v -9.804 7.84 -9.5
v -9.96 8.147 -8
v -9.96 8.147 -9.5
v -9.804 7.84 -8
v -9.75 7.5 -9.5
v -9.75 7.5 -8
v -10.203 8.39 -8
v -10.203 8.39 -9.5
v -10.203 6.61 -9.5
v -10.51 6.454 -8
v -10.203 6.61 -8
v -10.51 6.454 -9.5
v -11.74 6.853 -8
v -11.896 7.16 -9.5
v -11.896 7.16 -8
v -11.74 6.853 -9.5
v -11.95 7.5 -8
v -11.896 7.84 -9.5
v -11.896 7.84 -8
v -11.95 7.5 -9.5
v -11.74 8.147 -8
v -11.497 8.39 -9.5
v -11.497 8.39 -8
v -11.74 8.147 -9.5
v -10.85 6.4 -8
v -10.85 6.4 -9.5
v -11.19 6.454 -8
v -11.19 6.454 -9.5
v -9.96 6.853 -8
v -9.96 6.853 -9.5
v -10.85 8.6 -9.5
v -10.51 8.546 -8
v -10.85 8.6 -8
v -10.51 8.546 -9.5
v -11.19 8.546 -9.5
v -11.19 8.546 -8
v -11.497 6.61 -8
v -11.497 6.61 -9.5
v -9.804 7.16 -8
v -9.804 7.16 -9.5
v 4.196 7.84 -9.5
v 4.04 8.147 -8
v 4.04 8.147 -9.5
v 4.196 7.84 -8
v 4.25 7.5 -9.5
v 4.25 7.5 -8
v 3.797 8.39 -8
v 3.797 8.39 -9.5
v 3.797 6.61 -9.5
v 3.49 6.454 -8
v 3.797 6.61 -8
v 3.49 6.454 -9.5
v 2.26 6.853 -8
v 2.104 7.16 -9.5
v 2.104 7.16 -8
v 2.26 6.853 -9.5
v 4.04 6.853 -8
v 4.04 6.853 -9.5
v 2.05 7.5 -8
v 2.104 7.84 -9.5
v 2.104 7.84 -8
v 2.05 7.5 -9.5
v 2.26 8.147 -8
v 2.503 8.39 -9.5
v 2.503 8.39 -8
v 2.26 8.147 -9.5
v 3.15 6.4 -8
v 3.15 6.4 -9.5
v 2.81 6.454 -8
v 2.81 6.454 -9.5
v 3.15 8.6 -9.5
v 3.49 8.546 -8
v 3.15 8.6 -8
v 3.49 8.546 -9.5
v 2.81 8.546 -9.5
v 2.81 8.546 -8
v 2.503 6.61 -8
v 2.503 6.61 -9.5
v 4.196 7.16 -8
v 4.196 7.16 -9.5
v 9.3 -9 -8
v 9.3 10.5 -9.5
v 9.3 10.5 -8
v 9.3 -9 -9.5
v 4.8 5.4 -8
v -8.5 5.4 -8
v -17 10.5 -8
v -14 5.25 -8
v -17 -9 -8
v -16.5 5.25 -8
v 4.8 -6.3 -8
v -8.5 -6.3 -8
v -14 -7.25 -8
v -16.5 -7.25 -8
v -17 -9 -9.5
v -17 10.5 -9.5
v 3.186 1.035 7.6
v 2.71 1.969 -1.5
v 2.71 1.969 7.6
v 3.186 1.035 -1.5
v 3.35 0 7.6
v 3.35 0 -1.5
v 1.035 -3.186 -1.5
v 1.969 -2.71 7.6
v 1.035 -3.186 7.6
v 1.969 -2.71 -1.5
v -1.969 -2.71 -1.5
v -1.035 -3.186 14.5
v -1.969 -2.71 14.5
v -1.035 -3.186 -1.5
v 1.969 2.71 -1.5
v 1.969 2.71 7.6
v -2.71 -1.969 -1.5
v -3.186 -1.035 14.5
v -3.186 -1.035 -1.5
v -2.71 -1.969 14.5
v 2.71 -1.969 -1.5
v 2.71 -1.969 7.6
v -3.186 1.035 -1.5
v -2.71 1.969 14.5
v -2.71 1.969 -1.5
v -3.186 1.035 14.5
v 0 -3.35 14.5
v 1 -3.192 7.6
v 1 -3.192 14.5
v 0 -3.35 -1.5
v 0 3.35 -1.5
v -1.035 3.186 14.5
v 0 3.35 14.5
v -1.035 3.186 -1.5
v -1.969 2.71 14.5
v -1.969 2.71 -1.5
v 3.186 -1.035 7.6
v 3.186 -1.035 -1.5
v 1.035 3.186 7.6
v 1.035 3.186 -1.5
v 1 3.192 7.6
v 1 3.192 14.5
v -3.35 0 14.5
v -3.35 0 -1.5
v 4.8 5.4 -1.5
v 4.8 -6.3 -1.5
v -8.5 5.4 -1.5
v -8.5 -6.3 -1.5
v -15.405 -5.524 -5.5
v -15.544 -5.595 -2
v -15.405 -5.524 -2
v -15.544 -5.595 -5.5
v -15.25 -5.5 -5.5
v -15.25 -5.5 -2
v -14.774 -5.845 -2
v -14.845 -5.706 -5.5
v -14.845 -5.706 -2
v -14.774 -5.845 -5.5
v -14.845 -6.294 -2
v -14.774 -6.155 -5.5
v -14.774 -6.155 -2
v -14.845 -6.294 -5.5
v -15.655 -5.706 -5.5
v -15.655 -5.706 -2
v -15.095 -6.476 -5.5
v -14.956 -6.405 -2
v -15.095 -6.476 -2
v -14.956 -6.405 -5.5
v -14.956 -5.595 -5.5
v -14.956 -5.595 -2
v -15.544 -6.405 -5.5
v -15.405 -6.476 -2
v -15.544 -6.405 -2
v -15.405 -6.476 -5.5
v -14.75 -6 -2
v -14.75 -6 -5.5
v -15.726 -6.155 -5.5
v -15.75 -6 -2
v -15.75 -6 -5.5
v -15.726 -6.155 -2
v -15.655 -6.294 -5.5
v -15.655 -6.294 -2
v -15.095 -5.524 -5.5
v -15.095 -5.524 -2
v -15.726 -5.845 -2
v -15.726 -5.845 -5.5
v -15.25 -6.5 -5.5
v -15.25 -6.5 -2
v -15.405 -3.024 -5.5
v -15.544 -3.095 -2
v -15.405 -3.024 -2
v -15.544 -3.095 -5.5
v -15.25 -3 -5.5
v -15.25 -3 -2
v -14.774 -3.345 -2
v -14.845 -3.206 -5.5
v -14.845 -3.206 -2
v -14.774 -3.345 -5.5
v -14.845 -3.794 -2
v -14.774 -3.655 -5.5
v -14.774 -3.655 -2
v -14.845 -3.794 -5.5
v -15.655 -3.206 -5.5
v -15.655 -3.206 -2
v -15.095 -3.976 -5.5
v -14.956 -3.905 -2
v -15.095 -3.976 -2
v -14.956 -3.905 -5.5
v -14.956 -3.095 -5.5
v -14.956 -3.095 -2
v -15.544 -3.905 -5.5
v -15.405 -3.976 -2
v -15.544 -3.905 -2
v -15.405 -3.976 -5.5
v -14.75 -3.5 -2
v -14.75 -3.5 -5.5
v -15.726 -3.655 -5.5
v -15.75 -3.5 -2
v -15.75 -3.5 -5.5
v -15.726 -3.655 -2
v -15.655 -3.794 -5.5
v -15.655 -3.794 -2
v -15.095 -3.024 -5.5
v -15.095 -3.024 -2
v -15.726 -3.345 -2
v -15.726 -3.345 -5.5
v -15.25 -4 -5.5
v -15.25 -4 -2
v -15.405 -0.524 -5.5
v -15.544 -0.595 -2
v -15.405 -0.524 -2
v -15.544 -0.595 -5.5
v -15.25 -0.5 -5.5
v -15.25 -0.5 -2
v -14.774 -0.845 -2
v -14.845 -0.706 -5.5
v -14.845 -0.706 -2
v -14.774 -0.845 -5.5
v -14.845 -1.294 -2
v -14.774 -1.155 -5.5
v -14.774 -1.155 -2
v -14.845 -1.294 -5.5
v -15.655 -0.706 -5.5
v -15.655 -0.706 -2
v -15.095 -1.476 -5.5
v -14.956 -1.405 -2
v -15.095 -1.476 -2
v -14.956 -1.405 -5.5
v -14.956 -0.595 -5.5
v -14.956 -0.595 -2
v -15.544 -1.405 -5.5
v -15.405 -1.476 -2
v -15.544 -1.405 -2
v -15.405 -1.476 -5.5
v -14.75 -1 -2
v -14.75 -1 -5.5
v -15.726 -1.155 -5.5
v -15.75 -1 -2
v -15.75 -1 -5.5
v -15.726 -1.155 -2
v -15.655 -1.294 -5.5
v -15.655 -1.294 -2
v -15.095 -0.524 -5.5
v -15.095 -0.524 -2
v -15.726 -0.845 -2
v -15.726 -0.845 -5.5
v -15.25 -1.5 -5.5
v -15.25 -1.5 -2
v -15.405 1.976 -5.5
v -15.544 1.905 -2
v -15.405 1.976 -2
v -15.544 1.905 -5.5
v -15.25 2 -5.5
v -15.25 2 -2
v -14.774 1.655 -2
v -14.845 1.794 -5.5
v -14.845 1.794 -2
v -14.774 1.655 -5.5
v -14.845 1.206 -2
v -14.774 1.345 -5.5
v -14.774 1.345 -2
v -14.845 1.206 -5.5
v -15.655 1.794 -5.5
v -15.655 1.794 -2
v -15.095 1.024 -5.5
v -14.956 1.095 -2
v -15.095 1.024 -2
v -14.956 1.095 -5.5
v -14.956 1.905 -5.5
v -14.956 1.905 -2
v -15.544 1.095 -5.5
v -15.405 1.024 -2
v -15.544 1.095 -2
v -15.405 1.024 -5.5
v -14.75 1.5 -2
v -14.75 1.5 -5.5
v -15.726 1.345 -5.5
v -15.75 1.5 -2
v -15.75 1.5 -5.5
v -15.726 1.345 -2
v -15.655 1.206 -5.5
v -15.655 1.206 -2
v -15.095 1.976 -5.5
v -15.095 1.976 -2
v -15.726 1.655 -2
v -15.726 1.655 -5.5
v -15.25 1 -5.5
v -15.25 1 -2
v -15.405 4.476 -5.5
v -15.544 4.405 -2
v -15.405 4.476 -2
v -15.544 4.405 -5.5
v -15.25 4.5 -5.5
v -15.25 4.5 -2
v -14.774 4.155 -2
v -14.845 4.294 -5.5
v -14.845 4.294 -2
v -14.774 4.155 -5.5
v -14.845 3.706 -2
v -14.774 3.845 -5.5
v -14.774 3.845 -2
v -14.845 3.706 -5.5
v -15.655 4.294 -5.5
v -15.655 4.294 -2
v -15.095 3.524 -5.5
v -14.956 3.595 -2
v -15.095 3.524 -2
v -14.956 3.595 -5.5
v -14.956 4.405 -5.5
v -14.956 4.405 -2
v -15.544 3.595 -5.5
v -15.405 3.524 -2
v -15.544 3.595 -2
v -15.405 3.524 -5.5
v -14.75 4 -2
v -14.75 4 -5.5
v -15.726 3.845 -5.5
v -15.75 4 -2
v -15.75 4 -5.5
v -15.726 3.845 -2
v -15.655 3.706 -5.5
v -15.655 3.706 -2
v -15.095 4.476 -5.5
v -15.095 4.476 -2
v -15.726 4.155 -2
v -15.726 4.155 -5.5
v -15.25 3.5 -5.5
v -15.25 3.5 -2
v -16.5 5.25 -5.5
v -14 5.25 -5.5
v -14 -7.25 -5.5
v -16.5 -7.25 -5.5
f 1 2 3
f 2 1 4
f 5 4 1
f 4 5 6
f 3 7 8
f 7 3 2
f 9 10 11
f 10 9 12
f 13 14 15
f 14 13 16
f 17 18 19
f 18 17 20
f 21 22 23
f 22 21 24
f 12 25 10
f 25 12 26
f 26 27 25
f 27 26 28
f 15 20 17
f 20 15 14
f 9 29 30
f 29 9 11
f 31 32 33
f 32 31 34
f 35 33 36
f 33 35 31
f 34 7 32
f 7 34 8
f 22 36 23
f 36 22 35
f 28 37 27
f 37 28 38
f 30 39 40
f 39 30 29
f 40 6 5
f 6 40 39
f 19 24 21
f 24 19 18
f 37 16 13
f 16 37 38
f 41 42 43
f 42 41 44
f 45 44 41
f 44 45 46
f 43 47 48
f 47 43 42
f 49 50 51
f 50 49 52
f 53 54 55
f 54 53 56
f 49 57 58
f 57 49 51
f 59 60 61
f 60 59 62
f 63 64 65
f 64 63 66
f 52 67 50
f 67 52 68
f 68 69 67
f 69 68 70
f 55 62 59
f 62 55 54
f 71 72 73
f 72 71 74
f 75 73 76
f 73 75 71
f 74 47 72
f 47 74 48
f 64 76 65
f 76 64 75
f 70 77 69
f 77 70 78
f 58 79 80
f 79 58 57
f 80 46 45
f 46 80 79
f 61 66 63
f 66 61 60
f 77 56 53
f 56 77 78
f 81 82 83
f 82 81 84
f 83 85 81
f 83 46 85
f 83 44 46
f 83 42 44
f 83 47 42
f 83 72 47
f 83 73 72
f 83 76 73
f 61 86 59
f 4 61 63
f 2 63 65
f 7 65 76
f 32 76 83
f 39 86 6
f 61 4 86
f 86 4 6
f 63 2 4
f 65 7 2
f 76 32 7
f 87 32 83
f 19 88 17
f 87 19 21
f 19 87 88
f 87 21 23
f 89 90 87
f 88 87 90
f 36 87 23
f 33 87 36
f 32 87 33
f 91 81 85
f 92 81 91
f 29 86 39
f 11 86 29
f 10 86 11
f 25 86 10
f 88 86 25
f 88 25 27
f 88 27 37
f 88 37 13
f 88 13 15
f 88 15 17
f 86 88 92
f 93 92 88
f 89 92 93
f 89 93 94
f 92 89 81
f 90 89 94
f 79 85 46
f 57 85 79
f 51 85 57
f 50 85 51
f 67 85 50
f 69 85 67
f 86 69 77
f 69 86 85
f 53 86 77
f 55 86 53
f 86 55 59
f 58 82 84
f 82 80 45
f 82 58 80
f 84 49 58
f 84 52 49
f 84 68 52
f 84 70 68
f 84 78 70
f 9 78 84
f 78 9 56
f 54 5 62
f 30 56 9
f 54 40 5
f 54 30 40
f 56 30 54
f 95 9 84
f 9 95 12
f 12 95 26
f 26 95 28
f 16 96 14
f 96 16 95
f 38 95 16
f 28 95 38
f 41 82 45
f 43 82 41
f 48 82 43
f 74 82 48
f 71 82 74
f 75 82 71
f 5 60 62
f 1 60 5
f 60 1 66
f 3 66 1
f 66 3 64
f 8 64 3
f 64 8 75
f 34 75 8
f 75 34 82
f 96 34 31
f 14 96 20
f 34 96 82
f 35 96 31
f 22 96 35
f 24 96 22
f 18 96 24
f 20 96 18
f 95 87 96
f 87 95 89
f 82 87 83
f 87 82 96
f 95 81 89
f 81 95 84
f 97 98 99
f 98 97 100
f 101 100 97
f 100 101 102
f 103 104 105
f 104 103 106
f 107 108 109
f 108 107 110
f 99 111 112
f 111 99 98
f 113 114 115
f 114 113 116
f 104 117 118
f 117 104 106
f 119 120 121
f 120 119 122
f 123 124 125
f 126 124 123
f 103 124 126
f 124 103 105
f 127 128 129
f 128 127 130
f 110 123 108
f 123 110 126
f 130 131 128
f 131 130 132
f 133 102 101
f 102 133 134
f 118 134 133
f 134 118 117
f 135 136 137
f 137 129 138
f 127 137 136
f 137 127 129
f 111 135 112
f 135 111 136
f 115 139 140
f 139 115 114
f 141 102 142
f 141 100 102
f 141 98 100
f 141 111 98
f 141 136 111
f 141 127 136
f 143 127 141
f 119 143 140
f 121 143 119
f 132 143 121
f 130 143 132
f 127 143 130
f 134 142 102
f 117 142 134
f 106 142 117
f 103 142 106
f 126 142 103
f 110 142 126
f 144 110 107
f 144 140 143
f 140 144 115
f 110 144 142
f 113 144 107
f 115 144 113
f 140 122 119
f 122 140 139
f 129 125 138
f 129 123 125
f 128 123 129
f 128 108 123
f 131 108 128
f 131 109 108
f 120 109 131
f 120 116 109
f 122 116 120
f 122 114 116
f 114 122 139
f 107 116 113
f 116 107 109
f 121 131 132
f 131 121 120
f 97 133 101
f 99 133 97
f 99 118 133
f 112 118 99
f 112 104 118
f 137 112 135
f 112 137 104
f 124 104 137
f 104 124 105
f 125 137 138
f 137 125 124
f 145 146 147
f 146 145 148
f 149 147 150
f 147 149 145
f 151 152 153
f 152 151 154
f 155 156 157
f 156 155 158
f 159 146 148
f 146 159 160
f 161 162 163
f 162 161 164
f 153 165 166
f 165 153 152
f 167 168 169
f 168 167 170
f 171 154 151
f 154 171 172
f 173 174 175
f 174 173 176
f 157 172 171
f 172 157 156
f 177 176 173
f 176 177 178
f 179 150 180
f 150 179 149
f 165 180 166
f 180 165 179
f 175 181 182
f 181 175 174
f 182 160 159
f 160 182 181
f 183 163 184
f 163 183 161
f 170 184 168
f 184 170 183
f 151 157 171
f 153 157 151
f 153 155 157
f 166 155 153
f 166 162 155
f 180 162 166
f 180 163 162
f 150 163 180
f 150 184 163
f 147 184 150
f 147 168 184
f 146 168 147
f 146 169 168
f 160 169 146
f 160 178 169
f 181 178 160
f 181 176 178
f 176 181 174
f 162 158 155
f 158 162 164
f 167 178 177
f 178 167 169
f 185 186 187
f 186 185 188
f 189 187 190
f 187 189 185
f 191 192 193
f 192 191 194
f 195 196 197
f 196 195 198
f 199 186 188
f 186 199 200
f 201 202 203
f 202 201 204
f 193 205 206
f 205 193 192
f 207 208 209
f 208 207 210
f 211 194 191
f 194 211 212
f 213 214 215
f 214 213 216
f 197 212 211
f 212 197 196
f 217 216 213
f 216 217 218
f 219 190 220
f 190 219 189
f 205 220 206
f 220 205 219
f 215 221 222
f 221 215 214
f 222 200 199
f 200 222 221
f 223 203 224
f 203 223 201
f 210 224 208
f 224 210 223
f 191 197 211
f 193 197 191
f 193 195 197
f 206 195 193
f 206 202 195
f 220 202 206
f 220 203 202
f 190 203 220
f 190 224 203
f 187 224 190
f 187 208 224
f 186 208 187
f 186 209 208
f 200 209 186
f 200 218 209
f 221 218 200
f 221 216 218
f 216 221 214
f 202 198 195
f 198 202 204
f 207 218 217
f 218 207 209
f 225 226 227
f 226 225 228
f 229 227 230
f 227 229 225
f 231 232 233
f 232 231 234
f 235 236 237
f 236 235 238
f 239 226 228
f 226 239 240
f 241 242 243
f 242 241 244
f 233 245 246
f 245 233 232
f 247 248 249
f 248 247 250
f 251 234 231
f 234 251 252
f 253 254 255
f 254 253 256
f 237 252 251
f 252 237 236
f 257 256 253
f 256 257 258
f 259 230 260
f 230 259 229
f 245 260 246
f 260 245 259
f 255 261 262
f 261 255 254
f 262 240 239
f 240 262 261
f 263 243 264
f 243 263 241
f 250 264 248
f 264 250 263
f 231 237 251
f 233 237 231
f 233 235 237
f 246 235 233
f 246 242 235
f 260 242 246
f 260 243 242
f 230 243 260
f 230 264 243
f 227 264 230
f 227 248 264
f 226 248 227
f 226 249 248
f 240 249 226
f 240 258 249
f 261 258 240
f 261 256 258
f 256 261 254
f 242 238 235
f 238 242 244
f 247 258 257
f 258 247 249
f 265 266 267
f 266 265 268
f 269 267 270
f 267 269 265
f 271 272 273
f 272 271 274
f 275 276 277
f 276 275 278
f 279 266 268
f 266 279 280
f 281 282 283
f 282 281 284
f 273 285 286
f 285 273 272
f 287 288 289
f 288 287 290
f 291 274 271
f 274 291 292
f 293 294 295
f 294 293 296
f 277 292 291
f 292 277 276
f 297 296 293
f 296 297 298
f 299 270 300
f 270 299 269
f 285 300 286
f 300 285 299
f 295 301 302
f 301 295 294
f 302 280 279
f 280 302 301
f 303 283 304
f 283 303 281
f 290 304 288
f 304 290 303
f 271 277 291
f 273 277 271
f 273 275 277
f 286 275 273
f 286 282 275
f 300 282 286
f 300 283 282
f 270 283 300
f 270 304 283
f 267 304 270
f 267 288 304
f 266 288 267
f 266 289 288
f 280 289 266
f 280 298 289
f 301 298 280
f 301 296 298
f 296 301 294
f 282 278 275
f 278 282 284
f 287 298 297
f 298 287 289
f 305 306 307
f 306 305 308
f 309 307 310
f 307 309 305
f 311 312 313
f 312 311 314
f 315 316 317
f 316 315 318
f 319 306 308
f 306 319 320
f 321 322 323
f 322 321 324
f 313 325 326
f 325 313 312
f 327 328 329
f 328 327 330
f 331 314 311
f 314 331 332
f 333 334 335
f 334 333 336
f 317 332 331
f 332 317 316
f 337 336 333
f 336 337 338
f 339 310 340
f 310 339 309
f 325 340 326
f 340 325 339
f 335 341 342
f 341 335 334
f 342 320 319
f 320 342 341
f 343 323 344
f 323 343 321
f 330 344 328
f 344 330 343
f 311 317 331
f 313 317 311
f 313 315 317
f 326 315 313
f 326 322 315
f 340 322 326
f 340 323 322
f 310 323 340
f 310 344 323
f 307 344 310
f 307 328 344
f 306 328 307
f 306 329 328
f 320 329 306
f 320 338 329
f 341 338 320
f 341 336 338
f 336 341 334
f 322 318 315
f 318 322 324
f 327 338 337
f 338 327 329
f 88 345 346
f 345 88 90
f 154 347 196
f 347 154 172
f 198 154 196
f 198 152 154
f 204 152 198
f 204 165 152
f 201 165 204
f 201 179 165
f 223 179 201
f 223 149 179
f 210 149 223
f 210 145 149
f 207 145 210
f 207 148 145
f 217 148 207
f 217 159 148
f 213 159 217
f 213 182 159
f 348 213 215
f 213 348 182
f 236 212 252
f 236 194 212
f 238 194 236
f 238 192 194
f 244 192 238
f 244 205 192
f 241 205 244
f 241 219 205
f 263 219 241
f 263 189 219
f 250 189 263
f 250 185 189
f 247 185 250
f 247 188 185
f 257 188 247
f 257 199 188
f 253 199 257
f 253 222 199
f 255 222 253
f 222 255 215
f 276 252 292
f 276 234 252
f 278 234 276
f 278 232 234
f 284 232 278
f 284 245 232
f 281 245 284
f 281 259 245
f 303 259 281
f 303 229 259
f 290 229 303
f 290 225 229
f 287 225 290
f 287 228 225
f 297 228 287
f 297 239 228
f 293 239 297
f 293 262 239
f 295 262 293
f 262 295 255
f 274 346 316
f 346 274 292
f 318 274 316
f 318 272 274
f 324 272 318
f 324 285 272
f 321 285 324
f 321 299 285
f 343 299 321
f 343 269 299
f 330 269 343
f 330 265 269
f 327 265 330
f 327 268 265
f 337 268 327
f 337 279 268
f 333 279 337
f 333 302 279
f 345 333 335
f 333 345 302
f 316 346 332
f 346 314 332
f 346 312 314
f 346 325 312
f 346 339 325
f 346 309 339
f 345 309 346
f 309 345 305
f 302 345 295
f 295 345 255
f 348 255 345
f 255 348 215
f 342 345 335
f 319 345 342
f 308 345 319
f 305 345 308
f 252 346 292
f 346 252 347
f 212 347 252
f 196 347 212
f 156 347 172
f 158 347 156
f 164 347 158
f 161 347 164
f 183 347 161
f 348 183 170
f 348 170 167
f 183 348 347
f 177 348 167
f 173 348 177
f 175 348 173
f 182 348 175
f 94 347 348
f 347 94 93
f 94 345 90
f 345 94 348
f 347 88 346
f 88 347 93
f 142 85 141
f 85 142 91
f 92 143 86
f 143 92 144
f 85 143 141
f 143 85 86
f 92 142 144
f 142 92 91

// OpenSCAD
// file: maleHeader.scad
module maleHeader(pins=40,pinLength=11.2,rotation=0){
    length=2.5 * pins;
    color("Black") cube([length,2.5,2.5]);  //plastic base
    for (i=[0:pins-1]){ //pins
        translate([1.25+2.5*i,1.25,2.5]) color("white") cylinder(r=0.5,h=pinLength,center=true,$fn=20);
    }
}
maleHeader(pins=5,pinLength=7);
// main file
use <maleHeader.scad>

rotaryEncoder();

module rotaryEncoder(){
    translate([-17,-9,-9.5]){   //move origin
        difference(){
            color("black") cube([26.3,19.5,1.5]);
            for (i=[0:1]){
                translate([6.15+14*i,16.5,-0.1]) cylinder(r=1.1,h=2,$fn=20);
            }
        }
        translate([8.5,2.7,1.5]) color("green") cube([13.3,11.7,6.5]);
        difference(){
            translate([17,9,8]) color("white") cylinder(d=6.7,h=16,$fn=20);
            translate([18,5.5,17.1]) cube(7);
        }
        translate([3,1.75,1.5]) rotate([0,0,90]) maleHeader(pins=5,pinLength=7);
    }
}
